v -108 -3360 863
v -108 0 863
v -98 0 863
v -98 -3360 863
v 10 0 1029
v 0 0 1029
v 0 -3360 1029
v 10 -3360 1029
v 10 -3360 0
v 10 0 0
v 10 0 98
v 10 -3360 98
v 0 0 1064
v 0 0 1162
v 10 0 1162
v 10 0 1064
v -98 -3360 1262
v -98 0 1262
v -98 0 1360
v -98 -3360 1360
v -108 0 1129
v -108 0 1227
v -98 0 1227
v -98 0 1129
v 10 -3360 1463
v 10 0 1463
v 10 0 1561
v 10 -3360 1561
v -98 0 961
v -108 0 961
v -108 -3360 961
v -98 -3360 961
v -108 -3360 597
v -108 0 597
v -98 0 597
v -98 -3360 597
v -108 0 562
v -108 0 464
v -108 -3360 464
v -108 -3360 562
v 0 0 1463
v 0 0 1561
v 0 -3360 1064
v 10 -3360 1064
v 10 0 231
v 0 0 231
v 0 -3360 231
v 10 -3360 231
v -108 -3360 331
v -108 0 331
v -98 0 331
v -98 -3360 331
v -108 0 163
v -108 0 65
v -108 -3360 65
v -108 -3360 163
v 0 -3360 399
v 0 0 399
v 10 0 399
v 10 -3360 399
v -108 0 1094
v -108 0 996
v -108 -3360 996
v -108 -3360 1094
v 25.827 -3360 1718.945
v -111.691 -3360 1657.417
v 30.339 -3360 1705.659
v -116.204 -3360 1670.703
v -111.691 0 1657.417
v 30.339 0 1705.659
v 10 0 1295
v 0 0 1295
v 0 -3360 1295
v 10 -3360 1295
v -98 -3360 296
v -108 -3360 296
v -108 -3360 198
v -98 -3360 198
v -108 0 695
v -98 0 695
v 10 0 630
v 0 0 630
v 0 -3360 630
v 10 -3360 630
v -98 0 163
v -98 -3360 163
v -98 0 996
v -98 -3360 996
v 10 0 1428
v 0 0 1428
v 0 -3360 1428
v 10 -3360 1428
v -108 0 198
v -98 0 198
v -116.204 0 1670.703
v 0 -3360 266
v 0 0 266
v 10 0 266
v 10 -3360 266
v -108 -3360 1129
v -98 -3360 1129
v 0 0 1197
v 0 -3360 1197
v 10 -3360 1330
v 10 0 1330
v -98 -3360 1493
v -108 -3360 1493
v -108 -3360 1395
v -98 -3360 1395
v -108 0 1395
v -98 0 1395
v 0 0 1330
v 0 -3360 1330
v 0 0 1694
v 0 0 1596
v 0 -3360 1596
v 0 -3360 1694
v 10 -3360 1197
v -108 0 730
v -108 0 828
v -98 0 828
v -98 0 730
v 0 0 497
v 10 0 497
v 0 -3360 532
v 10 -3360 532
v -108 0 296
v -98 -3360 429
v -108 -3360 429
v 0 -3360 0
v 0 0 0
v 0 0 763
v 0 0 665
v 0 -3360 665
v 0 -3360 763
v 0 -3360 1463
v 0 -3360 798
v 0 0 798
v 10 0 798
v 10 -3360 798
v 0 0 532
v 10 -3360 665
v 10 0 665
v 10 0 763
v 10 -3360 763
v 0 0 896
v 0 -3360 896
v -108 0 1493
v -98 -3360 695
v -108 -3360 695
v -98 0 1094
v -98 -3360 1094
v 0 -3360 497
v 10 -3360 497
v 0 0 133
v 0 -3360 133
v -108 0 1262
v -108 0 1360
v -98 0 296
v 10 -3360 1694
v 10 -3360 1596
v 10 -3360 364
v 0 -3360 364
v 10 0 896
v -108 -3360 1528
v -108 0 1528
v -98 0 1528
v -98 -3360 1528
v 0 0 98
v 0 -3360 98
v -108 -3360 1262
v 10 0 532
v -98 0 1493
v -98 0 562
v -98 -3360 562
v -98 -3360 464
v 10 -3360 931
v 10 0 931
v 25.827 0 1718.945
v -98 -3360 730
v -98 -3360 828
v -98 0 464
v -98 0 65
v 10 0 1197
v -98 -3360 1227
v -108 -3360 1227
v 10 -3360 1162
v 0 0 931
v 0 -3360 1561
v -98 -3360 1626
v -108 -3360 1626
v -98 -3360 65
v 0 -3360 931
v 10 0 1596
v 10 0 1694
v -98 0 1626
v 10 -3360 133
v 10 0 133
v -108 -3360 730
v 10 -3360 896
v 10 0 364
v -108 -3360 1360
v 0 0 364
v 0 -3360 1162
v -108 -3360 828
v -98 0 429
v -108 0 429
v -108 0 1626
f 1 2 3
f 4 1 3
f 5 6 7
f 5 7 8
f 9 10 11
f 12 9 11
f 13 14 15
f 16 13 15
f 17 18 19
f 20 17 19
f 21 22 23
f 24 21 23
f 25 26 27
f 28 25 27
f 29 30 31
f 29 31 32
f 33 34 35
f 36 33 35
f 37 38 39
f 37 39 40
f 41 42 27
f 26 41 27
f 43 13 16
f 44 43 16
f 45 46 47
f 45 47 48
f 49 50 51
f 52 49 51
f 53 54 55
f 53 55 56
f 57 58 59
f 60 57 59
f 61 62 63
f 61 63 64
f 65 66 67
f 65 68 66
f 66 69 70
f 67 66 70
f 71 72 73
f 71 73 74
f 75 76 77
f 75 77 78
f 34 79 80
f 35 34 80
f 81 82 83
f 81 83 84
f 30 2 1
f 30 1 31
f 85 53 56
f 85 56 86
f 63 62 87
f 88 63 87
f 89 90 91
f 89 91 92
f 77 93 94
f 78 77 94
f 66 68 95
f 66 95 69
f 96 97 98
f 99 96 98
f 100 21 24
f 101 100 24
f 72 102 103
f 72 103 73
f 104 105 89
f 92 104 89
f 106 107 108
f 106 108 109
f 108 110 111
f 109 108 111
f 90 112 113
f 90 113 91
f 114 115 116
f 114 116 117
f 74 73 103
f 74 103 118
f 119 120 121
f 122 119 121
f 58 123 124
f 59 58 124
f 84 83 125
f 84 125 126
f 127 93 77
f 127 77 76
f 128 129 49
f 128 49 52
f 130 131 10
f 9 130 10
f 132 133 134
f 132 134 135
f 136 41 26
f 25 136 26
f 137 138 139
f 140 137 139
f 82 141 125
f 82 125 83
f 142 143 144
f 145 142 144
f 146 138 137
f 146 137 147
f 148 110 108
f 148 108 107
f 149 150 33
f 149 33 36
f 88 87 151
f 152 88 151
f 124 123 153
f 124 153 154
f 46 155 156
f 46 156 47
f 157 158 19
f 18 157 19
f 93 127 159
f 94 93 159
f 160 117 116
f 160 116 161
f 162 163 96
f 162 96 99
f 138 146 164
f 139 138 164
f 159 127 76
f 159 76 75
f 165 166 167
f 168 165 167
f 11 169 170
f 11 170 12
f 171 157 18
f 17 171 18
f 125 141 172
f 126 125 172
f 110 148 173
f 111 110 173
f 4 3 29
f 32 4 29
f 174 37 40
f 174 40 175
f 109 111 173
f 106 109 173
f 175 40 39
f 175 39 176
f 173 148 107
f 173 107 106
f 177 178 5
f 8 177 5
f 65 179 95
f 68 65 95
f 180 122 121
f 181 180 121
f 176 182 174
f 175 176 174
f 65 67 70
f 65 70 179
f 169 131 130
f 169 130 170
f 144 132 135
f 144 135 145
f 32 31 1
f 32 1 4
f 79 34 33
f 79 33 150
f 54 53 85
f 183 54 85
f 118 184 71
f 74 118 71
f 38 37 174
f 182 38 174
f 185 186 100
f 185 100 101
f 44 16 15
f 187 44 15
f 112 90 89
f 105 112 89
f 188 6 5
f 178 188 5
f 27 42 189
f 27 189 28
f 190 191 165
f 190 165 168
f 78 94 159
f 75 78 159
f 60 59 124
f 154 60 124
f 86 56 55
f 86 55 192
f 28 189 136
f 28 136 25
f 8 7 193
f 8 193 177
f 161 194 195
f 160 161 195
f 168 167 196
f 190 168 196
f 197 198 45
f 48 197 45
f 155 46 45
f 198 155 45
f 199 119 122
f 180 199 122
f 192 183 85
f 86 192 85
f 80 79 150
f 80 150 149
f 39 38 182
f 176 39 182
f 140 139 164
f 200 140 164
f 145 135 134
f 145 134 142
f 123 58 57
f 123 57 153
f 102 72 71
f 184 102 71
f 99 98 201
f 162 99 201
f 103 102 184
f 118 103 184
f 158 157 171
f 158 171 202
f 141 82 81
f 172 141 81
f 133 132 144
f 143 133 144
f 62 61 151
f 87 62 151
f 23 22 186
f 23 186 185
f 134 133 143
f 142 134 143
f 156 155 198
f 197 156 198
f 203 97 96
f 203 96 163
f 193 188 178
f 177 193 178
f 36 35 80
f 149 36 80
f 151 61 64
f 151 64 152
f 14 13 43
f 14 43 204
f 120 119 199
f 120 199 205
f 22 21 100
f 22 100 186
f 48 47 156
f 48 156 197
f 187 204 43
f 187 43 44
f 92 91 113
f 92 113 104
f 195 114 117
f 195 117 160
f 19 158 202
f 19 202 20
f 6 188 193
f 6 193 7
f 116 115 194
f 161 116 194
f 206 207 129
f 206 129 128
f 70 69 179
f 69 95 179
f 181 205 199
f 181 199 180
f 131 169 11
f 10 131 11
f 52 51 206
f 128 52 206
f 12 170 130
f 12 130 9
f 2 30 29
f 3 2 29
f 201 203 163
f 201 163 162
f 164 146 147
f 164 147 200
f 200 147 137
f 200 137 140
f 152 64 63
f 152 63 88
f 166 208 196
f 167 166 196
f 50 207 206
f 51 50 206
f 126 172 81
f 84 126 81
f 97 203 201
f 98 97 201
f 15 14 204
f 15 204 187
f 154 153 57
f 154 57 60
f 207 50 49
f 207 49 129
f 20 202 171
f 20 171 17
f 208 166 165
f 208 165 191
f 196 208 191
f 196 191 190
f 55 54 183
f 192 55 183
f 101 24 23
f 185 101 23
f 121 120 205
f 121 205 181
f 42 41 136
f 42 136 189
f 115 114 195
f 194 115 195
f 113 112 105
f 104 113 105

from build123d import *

# Parameters (mm, degrees)
F0_W     = 10
F0_H     = 98
F1_DEPTH = 3360


with BuildPart() as f1:
    # F0 (on Front) → F1 (new body)
    with BuildSketch(Plane.XZ):
        Polygon((-111.69109, 1657.416605), (30.339447, 1705.658979), (25.826527, 1718.945481), (-116.20401, 1670.703107), align=None)
        with Locations((-103, 1311)):
            Rectangle(F0_W, F0_H)
        with Locations((-103, 380)):
            Rectangle(F0_W, F0_H)
        with Locations((5, 581)):
            Rectangle(F0_W, F0_H)
        with Locations((-103, 912)):
            Rectangle(F0_W, F0_H)
        with Locations((5, 714)):
            Rectangle(F0_W, F0_H)
        with Locations((-103, 779)):
            Rectangle(F0_W, F0_H)
        with Locations((5, 315)):
            Rectangle(F0_W, F0_H)
        with Locations((5, 1113)):
            Rectangle(F0_W, F0_H)
        with Locations((5, 1512)):
            Rectangle(F0_W, F0_H)
        with Locations((5, 1246)):
            Rectangle(F0_W, F0_H)
        with Locations((-103, 114)):
            Rectangle(F0_W, F0_H)
        with Locations((5, 847)):
            Rectangle(F0_W, F0_H)
        with Locations((5, 980)):
            Rectangle(F0_W, F0_H)
        with Locations((-103, 1444)):
            Rectangle(F0_W, F0_H)
        with Locations((-103, 1178)):
            Rectangle(F0_W, F0_H)
        with Locations((5, 1645)):
            Rectangle(F0_W, F0_H)
        with Locations((-103, 247)):
            Rectangle(F0_W, F0_H)
        with Locations((5, 49)):
            Rectangle(F0_W, F0_H)
        with Locations((-103, 646)):
            Rectangle(F0_W, F0_H)
        with Locations((5, 1379)):
            Rectangle(F0_W, F0_H)
        with Locations((-103, 1577)):
            Rectangle(F0_W, F0_H)
        with Locations((-103, 513)):
            Rectangle(F0_W, F0_H)
        with Locations((5, 448)):
            Rectangle(F0_W, F0_H)
        with Locations((5, 182)):
            Rectangle(F0_W, F0_H)
        with Locations((-103, 1045)):
            Rectangle(F0_W, F0_H)
    extrude(amount=F1_DEPTH)


solid = f1.part
